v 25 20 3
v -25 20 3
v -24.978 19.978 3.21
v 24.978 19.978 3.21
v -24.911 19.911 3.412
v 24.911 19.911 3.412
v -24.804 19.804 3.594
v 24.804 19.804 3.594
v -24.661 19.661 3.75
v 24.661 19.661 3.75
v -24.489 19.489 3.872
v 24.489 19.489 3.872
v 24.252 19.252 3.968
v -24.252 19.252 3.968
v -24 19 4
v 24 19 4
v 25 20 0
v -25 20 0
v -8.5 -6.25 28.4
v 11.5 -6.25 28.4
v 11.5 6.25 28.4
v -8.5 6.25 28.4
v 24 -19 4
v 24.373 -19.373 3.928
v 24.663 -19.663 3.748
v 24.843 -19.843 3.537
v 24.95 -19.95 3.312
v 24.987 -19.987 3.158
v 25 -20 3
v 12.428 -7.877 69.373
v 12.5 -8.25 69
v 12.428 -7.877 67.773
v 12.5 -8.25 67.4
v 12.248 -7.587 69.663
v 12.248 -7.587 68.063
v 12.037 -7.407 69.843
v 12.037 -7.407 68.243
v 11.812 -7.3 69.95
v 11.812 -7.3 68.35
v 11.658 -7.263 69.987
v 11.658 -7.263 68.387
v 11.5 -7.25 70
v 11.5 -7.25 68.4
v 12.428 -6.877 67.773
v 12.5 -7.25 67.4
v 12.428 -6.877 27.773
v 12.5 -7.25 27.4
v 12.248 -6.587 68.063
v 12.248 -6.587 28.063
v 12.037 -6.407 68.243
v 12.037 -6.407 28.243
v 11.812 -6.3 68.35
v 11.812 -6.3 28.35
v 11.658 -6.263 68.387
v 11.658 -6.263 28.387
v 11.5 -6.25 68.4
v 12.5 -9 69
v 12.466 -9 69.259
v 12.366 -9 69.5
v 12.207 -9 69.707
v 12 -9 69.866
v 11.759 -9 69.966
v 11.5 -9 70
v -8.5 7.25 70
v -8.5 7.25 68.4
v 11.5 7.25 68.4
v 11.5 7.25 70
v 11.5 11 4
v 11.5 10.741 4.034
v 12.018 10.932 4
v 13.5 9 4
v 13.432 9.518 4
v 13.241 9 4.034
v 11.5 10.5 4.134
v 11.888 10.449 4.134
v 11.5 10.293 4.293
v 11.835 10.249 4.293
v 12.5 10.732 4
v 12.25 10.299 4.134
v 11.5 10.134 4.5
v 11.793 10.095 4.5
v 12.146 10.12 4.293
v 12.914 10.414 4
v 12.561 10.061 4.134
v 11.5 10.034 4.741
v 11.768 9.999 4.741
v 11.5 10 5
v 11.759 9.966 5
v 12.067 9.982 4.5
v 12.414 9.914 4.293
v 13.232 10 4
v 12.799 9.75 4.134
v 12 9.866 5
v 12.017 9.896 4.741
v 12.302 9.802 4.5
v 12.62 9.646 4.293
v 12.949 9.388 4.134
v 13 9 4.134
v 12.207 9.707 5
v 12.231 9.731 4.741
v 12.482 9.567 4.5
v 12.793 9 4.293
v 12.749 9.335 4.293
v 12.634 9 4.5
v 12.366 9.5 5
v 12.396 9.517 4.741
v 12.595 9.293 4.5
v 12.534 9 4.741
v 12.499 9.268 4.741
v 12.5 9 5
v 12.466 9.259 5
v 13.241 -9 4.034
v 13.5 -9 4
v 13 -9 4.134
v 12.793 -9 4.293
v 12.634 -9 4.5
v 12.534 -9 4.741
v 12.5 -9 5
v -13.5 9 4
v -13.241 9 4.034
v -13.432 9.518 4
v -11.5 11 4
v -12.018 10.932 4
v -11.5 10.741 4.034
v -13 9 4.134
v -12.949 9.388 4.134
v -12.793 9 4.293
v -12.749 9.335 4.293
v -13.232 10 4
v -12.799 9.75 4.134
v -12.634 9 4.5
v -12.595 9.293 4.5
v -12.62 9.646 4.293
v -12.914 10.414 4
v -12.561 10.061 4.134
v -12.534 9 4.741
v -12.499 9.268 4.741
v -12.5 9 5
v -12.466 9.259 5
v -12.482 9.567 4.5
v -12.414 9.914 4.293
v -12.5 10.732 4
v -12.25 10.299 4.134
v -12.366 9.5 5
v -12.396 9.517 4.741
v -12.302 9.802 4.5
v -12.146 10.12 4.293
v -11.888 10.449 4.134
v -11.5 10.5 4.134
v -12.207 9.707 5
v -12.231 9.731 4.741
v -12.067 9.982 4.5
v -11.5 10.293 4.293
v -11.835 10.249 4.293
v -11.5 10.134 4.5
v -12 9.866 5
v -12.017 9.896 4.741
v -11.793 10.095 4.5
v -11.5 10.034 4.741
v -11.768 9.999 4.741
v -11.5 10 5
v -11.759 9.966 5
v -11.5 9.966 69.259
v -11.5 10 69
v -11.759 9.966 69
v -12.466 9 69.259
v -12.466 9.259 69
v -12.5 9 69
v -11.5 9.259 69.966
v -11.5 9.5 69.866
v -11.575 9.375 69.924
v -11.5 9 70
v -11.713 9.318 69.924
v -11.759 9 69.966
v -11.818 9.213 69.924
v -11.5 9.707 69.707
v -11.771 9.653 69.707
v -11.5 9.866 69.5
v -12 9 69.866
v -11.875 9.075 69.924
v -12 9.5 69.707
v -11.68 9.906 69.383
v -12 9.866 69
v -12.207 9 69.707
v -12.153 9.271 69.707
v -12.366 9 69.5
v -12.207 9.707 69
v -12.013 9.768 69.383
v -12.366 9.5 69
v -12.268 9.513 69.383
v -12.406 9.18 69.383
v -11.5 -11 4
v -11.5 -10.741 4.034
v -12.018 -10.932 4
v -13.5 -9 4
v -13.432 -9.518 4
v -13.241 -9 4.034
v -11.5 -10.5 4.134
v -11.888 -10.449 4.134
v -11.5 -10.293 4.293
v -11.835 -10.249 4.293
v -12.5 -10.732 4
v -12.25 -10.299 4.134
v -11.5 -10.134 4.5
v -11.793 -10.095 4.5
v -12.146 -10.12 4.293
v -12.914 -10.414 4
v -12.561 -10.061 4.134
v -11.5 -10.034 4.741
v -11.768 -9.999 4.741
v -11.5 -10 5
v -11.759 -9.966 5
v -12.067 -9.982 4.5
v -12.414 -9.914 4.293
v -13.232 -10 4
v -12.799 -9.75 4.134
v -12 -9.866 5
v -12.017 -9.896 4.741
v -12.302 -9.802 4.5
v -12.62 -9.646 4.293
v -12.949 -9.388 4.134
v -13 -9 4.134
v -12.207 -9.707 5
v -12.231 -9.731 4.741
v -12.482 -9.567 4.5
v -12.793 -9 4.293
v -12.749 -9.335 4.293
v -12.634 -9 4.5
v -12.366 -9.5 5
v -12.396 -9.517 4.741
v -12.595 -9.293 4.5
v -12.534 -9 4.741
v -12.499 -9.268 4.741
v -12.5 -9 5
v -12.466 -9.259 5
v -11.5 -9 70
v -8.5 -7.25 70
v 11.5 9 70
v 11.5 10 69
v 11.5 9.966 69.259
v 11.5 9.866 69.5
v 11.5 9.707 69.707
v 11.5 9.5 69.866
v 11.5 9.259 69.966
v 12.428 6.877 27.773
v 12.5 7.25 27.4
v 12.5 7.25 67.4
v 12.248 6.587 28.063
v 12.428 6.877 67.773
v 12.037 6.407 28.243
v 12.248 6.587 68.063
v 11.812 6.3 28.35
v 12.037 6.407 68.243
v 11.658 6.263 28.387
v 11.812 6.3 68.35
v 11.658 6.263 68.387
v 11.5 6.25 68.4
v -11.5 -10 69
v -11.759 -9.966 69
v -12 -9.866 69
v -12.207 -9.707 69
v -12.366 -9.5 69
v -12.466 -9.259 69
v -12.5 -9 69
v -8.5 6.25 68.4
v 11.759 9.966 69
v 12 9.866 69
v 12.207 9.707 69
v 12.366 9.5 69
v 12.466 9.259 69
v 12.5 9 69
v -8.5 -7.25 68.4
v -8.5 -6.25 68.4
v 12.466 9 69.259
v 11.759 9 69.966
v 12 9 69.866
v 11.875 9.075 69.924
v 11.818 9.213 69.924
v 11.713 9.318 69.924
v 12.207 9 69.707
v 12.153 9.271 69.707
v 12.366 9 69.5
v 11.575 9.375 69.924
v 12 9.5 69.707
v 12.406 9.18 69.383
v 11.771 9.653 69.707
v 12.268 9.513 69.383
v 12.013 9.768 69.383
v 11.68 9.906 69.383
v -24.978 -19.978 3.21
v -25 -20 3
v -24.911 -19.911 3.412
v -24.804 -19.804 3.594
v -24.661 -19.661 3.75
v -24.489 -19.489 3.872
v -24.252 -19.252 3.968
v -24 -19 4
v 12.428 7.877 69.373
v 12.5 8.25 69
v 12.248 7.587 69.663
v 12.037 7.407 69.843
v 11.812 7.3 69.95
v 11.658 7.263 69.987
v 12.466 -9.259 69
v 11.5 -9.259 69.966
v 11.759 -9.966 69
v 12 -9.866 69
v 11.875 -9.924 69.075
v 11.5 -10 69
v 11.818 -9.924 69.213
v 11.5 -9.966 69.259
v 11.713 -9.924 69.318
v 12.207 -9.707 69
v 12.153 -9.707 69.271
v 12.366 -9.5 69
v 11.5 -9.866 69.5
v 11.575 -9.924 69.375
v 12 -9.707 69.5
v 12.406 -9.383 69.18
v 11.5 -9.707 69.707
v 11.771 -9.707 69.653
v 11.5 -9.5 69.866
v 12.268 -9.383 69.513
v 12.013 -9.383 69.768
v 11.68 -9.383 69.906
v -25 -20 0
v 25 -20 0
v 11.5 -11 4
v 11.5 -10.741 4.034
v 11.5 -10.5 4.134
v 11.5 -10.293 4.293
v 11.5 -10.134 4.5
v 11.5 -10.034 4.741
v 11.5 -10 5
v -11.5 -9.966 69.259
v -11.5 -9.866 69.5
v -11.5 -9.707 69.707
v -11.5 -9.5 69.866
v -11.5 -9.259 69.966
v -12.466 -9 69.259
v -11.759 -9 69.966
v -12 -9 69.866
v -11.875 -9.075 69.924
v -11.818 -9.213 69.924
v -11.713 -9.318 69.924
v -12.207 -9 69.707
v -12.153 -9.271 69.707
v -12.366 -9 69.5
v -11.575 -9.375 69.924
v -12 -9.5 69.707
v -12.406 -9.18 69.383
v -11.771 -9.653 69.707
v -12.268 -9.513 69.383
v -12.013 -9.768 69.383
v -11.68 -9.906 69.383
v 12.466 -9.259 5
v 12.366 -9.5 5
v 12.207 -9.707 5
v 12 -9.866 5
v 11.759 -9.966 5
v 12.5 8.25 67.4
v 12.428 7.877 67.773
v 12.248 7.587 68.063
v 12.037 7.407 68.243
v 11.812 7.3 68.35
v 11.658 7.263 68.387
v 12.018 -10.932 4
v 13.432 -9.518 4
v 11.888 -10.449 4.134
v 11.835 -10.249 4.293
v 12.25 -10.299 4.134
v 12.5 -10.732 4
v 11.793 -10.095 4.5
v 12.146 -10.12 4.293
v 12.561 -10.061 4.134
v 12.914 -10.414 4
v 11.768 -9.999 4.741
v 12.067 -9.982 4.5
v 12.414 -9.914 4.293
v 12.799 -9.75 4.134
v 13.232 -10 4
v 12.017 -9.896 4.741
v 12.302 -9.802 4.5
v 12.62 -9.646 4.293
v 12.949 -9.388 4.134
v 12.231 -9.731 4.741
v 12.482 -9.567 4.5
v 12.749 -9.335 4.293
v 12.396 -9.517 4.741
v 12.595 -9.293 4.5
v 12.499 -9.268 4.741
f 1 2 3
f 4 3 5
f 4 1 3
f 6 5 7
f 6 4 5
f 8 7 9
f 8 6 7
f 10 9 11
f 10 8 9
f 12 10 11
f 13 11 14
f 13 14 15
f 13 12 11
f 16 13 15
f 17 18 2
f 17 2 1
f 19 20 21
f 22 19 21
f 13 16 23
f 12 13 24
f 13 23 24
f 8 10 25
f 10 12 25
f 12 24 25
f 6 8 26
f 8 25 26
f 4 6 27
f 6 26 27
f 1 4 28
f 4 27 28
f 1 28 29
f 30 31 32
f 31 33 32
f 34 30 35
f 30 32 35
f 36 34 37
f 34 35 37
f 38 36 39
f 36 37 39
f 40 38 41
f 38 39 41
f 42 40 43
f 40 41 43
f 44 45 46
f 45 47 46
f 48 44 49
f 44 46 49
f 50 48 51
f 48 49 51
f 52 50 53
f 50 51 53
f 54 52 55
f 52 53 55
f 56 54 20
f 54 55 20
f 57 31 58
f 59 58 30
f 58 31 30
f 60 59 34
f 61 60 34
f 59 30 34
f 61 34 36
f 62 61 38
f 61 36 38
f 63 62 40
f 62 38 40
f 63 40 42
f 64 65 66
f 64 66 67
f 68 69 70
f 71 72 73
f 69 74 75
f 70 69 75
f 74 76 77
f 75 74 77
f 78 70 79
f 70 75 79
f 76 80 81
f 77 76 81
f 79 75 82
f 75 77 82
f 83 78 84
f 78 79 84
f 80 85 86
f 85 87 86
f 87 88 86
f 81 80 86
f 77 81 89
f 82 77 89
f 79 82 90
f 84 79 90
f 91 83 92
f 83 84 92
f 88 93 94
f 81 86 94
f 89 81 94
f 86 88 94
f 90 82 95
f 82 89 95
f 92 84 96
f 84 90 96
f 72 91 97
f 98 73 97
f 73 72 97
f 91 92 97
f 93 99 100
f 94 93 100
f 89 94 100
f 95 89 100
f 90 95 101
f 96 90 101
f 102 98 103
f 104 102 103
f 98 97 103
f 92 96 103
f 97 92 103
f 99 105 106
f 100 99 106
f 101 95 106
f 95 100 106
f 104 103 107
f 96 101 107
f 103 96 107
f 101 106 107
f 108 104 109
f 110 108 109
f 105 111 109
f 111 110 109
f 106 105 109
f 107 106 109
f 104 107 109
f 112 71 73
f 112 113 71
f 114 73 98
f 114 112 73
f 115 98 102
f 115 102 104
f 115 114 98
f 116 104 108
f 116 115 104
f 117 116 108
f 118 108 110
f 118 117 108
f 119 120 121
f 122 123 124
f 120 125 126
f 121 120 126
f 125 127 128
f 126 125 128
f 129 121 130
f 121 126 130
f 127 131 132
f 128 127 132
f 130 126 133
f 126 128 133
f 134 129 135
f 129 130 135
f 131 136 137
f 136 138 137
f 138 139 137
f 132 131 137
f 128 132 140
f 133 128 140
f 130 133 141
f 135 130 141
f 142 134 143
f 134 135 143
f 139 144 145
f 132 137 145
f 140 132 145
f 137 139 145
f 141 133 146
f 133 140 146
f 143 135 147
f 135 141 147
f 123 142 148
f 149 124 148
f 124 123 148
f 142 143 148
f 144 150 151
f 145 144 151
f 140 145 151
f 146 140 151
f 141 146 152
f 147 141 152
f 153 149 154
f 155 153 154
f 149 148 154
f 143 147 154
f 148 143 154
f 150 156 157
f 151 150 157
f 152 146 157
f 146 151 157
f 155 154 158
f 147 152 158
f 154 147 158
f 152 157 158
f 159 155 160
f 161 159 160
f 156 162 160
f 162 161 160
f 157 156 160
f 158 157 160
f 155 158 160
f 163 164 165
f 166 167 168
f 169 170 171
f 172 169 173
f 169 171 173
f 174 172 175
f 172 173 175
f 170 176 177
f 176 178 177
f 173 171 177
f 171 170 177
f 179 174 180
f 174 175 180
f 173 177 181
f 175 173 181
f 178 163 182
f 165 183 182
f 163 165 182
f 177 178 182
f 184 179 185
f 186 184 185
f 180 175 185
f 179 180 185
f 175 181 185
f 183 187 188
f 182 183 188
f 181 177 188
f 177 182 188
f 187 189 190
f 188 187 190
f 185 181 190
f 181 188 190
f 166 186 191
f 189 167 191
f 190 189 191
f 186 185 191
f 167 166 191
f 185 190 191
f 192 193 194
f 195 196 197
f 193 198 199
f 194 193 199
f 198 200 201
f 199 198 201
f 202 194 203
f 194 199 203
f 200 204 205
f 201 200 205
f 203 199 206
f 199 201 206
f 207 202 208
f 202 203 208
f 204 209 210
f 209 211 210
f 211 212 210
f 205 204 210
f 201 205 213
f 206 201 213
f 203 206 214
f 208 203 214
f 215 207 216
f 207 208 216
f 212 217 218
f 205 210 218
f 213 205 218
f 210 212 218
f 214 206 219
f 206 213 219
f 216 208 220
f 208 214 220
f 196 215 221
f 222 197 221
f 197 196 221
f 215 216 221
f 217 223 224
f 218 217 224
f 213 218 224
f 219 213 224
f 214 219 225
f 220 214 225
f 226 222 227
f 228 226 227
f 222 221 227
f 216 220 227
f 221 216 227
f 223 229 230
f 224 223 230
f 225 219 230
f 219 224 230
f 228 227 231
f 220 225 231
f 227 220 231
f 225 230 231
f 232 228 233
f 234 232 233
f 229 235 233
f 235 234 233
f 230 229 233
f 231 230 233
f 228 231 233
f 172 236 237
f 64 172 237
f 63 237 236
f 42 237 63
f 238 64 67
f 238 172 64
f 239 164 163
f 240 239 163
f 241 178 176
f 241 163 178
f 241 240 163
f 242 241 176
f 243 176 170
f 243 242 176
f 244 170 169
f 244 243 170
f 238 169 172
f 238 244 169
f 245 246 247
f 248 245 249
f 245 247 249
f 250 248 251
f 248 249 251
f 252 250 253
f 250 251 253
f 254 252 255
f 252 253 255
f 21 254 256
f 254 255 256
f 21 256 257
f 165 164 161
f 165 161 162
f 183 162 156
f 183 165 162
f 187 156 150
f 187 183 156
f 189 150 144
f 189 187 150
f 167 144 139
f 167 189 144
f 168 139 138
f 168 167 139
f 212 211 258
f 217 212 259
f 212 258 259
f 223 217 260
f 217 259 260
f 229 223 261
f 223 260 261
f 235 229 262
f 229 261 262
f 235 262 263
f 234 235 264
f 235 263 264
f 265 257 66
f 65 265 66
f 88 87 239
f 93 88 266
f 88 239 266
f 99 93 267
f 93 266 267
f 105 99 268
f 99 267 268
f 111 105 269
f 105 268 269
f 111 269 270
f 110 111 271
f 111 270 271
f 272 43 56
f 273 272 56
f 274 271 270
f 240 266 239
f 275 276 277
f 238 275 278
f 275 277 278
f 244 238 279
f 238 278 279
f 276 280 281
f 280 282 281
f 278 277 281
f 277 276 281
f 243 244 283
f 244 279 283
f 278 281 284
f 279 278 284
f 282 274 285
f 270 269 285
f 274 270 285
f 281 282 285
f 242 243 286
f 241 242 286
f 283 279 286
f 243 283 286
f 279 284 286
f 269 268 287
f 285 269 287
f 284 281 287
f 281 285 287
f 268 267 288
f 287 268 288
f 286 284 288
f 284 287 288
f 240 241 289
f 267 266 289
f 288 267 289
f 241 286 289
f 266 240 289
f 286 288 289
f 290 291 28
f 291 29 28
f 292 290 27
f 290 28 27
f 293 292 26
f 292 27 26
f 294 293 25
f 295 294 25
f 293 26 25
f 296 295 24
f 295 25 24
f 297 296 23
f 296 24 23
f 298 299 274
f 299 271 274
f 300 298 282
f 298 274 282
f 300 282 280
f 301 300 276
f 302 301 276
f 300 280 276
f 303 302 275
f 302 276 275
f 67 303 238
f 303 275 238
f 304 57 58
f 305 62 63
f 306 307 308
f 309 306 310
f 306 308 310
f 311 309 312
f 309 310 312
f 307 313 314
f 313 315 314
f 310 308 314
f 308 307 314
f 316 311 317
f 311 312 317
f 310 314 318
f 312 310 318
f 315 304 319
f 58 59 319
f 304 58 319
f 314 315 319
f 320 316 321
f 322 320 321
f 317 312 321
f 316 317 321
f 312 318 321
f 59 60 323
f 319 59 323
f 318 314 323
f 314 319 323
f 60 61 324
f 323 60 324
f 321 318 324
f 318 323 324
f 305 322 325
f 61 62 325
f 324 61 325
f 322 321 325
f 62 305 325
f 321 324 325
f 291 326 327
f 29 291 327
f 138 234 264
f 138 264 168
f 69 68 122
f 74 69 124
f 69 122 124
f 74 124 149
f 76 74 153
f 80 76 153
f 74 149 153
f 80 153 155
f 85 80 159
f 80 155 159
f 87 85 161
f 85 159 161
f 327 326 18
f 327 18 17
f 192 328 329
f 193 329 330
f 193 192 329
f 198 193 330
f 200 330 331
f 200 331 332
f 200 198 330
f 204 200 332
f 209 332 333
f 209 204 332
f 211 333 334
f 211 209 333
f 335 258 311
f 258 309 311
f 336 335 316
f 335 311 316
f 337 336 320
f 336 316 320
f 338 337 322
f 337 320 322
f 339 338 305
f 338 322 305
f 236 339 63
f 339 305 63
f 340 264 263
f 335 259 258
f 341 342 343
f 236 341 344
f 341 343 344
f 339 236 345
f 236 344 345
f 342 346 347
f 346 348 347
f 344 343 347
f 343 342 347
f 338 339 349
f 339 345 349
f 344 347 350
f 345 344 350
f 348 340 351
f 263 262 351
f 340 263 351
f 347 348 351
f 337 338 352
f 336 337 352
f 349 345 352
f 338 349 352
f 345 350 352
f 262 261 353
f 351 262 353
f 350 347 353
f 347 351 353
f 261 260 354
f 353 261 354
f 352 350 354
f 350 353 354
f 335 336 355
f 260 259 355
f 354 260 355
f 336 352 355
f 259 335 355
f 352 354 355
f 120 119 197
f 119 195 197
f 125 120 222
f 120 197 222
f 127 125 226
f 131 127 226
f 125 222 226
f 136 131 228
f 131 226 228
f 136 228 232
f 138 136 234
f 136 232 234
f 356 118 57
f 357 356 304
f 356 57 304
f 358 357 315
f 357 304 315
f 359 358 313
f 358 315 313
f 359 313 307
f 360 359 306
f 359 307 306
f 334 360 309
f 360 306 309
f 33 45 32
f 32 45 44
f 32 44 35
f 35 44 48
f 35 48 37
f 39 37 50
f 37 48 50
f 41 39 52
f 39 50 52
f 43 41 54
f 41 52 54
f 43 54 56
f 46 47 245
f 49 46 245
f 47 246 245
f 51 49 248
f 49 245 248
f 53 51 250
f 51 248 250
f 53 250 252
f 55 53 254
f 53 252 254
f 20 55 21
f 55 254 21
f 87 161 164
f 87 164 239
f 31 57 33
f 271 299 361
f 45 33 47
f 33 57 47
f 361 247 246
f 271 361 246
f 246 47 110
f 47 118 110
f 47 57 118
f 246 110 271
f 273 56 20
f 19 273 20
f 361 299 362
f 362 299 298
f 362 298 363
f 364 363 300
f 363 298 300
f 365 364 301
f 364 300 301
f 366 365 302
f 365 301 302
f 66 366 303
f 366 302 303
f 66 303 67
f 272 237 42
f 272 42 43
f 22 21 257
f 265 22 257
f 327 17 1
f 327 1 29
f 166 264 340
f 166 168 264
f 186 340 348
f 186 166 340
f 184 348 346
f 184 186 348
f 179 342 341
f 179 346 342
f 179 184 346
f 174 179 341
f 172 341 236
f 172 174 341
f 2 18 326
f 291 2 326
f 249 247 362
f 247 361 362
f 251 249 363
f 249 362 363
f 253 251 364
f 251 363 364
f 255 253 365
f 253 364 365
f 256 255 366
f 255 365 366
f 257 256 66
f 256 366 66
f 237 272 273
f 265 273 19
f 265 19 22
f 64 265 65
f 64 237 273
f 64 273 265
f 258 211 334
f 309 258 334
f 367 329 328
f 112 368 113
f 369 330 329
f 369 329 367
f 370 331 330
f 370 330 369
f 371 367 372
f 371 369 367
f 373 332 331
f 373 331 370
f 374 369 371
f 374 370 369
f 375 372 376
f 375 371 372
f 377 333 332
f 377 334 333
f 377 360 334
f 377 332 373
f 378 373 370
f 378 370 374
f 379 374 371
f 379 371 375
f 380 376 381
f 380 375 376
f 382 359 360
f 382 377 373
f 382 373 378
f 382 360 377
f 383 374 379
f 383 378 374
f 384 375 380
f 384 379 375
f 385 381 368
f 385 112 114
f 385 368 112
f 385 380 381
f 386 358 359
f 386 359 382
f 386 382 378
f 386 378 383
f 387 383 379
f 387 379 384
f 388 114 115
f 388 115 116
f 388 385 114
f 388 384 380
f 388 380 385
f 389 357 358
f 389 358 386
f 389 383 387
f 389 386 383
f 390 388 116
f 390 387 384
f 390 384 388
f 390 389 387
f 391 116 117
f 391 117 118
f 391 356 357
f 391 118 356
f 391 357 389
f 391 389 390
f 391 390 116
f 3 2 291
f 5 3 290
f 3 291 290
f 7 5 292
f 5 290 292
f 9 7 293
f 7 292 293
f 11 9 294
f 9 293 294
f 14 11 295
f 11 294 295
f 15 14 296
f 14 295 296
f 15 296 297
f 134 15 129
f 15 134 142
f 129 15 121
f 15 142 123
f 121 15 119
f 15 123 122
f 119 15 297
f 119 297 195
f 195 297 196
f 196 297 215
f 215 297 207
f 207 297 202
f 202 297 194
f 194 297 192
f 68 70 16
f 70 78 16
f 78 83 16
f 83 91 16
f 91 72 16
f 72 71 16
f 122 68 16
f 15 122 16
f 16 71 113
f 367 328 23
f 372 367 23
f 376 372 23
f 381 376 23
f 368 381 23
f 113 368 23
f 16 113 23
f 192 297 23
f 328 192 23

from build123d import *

# Parameters (mm, degrees)
F0_W     = 25
F0_H     = 20
F1_DEPTH = 70
F3_DEPTH = 21
F4_W     = 50
F4_H     = 40
F5_DEPTH = 4
F6_R     = 1


with BuildPart() as f1:
    # F0 (on Top) → F1 (new body)
    with BuildSketch(Plane.XY):
        Rectangle(F0_W, F0_H)
    extrude(amount=F1_DEPTH)

    # F2 (on face) → F3 (cut)
    with BuildSketch(Plane.YZ.offset(12.5)):
        Polygon((7.25, 70), (-7.25, 70), (-7.25, 68.4), (-6.25, 68.4), (-6.25, 28.4), (6.25, 28.4), (6.25, 68.4), (7.25, 68.4), align=None)
    extrude(amount=-F3_DEPTH, mode=Mode.SUBTRACT)

    # F4 (on face) → F5 (join)
    with BuildSketch(Plane(origin=(0, 0, 0), x_dir=(1, 0, 0), z_dir=(0, 0, -1))):
        Rectangle(F4_W, F4_H)
    extrude(amount=-F5_DEPTH)

    # F6
    f6_edges = [f1.edges().sort_by_distance(p)[0] for p in [
        (0, 20, 4),
        (-25, 0, 4),
        (25, 0, 4),
        (0, -20, 4),
        (0, -10, 4),
        (-12.5, 0, 4),
        (0, 10, 4),
        (12.5, 0, 4),
        (12.5, 10, 37),
        (12.5, 8.625, 70),
        (12.5, 7.25, 69.2),
        (12.5, 6.75, 68.4),
        (12.5, 6.25, 48.4),
        (12.5, 0, 28.4),
        (12.5, -6.25, 48.4),
        (12.5, -6.75, 68.4),
        (12.5, -7.25, 69.2),
        (12.5, -8.625, 70),
        (12.5, -10, 37),
        (-12.5, 10, 37),
        (0, 10, 70),
        (-12.5, -10, 37),
        (-12.5, 0, 70),
        (0, -10, 70),
    ]]
    fillet(f6_edges, radius=F6_R)


solid = f1.part
